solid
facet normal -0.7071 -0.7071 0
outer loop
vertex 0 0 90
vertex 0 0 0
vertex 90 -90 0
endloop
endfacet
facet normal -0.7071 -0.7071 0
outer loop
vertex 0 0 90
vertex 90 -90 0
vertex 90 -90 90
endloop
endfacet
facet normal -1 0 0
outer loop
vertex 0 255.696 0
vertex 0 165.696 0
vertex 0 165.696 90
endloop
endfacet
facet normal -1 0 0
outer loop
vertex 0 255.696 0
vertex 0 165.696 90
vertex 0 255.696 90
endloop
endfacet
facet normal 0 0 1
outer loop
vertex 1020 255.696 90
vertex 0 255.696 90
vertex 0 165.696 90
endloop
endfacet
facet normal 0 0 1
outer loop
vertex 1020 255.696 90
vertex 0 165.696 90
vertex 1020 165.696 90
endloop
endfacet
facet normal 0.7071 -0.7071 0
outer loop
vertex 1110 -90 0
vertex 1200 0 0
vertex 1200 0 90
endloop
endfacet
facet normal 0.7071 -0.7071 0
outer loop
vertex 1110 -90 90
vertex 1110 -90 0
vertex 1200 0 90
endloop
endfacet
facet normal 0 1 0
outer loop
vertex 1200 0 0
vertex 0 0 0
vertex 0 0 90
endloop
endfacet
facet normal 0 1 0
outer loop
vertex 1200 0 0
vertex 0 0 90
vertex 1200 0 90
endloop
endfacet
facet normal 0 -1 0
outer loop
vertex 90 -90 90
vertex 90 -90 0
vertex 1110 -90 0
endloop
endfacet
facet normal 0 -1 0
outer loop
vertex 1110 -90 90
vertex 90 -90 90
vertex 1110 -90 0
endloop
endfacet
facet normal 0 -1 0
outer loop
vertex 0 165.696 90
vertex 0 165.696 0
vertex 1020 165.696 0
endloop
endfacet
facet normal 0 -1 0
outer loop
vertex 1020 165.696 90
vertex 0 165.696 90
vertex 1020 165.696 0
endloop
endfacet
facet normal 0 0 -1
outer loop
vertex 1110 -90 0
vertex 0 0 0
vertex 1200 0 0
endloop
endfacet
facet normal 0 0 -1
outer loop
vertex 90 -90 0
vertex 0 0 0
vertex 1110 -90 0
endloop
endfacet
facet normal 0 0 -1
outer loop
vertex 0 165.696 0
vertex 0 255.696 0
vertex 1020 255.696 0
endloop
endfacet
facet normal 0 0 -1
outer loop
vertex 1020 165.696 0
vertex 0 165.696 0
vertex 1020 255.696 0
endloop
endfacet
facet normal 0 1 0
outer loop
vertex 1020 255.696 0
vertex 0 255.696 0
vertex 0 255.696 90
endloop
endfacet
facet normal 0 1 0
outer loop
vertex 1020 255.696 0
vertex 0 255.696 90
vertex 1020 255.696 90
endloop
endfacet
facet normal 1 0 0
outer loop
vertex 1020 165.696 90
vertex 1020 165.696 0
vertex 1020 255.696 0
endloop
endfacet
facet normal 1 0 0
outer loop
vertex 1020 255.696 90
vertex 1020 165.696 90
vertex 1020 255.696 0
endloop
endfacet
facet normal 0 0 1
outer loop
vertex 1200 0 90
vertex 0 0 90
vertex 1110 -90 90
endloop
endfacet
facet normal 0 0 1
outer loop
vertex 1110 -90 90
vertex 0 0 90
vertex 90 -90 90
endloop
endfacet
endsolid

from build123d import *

# Parameters (mm, degrees)
F0_W     = 1200
F0_H     = 90
F1_DEPTH = 90
F2_SIZE  = 89.99999
F3_W     = 1020
F3_H     = 90
F4_DEPTH = 90


# Not quite as in the source:
# - a fillet or chamfer is up to 0.001 mm smaller than in the source, because OpenCascade refuses the exact size


with BuildPart() as f1:
    # F0 (on Top) → F1 (new body)
    with BuildSketch(Plane.XY):
        with Locations((600, -45)):
            Rectangle(F0_W, F0_H)
    extrude(amount=F1_DEPTH)

    # F2 (size 90 in the source; OpenCascade refuses exactly that, so slightly less here)
    f2_edges = [f1.edges().sort_by_distance(p)[0] for p in [
        (1200, -90, 45),
        (0, -90, 45),
    ]]
    chamfer(f2_edges, length=F2_SIZE)


with BuildPart() as f4:
    # F3 (on Top) → F4 (new body)
    with BuildSketch(Plane.XY):
        with Locations((510, 210.6959205866)):
            Rectangle(F3_W, F3_H)
    extrude(amount=F4_DEPTH)


solid = Compound([f1.part, f4.part])
